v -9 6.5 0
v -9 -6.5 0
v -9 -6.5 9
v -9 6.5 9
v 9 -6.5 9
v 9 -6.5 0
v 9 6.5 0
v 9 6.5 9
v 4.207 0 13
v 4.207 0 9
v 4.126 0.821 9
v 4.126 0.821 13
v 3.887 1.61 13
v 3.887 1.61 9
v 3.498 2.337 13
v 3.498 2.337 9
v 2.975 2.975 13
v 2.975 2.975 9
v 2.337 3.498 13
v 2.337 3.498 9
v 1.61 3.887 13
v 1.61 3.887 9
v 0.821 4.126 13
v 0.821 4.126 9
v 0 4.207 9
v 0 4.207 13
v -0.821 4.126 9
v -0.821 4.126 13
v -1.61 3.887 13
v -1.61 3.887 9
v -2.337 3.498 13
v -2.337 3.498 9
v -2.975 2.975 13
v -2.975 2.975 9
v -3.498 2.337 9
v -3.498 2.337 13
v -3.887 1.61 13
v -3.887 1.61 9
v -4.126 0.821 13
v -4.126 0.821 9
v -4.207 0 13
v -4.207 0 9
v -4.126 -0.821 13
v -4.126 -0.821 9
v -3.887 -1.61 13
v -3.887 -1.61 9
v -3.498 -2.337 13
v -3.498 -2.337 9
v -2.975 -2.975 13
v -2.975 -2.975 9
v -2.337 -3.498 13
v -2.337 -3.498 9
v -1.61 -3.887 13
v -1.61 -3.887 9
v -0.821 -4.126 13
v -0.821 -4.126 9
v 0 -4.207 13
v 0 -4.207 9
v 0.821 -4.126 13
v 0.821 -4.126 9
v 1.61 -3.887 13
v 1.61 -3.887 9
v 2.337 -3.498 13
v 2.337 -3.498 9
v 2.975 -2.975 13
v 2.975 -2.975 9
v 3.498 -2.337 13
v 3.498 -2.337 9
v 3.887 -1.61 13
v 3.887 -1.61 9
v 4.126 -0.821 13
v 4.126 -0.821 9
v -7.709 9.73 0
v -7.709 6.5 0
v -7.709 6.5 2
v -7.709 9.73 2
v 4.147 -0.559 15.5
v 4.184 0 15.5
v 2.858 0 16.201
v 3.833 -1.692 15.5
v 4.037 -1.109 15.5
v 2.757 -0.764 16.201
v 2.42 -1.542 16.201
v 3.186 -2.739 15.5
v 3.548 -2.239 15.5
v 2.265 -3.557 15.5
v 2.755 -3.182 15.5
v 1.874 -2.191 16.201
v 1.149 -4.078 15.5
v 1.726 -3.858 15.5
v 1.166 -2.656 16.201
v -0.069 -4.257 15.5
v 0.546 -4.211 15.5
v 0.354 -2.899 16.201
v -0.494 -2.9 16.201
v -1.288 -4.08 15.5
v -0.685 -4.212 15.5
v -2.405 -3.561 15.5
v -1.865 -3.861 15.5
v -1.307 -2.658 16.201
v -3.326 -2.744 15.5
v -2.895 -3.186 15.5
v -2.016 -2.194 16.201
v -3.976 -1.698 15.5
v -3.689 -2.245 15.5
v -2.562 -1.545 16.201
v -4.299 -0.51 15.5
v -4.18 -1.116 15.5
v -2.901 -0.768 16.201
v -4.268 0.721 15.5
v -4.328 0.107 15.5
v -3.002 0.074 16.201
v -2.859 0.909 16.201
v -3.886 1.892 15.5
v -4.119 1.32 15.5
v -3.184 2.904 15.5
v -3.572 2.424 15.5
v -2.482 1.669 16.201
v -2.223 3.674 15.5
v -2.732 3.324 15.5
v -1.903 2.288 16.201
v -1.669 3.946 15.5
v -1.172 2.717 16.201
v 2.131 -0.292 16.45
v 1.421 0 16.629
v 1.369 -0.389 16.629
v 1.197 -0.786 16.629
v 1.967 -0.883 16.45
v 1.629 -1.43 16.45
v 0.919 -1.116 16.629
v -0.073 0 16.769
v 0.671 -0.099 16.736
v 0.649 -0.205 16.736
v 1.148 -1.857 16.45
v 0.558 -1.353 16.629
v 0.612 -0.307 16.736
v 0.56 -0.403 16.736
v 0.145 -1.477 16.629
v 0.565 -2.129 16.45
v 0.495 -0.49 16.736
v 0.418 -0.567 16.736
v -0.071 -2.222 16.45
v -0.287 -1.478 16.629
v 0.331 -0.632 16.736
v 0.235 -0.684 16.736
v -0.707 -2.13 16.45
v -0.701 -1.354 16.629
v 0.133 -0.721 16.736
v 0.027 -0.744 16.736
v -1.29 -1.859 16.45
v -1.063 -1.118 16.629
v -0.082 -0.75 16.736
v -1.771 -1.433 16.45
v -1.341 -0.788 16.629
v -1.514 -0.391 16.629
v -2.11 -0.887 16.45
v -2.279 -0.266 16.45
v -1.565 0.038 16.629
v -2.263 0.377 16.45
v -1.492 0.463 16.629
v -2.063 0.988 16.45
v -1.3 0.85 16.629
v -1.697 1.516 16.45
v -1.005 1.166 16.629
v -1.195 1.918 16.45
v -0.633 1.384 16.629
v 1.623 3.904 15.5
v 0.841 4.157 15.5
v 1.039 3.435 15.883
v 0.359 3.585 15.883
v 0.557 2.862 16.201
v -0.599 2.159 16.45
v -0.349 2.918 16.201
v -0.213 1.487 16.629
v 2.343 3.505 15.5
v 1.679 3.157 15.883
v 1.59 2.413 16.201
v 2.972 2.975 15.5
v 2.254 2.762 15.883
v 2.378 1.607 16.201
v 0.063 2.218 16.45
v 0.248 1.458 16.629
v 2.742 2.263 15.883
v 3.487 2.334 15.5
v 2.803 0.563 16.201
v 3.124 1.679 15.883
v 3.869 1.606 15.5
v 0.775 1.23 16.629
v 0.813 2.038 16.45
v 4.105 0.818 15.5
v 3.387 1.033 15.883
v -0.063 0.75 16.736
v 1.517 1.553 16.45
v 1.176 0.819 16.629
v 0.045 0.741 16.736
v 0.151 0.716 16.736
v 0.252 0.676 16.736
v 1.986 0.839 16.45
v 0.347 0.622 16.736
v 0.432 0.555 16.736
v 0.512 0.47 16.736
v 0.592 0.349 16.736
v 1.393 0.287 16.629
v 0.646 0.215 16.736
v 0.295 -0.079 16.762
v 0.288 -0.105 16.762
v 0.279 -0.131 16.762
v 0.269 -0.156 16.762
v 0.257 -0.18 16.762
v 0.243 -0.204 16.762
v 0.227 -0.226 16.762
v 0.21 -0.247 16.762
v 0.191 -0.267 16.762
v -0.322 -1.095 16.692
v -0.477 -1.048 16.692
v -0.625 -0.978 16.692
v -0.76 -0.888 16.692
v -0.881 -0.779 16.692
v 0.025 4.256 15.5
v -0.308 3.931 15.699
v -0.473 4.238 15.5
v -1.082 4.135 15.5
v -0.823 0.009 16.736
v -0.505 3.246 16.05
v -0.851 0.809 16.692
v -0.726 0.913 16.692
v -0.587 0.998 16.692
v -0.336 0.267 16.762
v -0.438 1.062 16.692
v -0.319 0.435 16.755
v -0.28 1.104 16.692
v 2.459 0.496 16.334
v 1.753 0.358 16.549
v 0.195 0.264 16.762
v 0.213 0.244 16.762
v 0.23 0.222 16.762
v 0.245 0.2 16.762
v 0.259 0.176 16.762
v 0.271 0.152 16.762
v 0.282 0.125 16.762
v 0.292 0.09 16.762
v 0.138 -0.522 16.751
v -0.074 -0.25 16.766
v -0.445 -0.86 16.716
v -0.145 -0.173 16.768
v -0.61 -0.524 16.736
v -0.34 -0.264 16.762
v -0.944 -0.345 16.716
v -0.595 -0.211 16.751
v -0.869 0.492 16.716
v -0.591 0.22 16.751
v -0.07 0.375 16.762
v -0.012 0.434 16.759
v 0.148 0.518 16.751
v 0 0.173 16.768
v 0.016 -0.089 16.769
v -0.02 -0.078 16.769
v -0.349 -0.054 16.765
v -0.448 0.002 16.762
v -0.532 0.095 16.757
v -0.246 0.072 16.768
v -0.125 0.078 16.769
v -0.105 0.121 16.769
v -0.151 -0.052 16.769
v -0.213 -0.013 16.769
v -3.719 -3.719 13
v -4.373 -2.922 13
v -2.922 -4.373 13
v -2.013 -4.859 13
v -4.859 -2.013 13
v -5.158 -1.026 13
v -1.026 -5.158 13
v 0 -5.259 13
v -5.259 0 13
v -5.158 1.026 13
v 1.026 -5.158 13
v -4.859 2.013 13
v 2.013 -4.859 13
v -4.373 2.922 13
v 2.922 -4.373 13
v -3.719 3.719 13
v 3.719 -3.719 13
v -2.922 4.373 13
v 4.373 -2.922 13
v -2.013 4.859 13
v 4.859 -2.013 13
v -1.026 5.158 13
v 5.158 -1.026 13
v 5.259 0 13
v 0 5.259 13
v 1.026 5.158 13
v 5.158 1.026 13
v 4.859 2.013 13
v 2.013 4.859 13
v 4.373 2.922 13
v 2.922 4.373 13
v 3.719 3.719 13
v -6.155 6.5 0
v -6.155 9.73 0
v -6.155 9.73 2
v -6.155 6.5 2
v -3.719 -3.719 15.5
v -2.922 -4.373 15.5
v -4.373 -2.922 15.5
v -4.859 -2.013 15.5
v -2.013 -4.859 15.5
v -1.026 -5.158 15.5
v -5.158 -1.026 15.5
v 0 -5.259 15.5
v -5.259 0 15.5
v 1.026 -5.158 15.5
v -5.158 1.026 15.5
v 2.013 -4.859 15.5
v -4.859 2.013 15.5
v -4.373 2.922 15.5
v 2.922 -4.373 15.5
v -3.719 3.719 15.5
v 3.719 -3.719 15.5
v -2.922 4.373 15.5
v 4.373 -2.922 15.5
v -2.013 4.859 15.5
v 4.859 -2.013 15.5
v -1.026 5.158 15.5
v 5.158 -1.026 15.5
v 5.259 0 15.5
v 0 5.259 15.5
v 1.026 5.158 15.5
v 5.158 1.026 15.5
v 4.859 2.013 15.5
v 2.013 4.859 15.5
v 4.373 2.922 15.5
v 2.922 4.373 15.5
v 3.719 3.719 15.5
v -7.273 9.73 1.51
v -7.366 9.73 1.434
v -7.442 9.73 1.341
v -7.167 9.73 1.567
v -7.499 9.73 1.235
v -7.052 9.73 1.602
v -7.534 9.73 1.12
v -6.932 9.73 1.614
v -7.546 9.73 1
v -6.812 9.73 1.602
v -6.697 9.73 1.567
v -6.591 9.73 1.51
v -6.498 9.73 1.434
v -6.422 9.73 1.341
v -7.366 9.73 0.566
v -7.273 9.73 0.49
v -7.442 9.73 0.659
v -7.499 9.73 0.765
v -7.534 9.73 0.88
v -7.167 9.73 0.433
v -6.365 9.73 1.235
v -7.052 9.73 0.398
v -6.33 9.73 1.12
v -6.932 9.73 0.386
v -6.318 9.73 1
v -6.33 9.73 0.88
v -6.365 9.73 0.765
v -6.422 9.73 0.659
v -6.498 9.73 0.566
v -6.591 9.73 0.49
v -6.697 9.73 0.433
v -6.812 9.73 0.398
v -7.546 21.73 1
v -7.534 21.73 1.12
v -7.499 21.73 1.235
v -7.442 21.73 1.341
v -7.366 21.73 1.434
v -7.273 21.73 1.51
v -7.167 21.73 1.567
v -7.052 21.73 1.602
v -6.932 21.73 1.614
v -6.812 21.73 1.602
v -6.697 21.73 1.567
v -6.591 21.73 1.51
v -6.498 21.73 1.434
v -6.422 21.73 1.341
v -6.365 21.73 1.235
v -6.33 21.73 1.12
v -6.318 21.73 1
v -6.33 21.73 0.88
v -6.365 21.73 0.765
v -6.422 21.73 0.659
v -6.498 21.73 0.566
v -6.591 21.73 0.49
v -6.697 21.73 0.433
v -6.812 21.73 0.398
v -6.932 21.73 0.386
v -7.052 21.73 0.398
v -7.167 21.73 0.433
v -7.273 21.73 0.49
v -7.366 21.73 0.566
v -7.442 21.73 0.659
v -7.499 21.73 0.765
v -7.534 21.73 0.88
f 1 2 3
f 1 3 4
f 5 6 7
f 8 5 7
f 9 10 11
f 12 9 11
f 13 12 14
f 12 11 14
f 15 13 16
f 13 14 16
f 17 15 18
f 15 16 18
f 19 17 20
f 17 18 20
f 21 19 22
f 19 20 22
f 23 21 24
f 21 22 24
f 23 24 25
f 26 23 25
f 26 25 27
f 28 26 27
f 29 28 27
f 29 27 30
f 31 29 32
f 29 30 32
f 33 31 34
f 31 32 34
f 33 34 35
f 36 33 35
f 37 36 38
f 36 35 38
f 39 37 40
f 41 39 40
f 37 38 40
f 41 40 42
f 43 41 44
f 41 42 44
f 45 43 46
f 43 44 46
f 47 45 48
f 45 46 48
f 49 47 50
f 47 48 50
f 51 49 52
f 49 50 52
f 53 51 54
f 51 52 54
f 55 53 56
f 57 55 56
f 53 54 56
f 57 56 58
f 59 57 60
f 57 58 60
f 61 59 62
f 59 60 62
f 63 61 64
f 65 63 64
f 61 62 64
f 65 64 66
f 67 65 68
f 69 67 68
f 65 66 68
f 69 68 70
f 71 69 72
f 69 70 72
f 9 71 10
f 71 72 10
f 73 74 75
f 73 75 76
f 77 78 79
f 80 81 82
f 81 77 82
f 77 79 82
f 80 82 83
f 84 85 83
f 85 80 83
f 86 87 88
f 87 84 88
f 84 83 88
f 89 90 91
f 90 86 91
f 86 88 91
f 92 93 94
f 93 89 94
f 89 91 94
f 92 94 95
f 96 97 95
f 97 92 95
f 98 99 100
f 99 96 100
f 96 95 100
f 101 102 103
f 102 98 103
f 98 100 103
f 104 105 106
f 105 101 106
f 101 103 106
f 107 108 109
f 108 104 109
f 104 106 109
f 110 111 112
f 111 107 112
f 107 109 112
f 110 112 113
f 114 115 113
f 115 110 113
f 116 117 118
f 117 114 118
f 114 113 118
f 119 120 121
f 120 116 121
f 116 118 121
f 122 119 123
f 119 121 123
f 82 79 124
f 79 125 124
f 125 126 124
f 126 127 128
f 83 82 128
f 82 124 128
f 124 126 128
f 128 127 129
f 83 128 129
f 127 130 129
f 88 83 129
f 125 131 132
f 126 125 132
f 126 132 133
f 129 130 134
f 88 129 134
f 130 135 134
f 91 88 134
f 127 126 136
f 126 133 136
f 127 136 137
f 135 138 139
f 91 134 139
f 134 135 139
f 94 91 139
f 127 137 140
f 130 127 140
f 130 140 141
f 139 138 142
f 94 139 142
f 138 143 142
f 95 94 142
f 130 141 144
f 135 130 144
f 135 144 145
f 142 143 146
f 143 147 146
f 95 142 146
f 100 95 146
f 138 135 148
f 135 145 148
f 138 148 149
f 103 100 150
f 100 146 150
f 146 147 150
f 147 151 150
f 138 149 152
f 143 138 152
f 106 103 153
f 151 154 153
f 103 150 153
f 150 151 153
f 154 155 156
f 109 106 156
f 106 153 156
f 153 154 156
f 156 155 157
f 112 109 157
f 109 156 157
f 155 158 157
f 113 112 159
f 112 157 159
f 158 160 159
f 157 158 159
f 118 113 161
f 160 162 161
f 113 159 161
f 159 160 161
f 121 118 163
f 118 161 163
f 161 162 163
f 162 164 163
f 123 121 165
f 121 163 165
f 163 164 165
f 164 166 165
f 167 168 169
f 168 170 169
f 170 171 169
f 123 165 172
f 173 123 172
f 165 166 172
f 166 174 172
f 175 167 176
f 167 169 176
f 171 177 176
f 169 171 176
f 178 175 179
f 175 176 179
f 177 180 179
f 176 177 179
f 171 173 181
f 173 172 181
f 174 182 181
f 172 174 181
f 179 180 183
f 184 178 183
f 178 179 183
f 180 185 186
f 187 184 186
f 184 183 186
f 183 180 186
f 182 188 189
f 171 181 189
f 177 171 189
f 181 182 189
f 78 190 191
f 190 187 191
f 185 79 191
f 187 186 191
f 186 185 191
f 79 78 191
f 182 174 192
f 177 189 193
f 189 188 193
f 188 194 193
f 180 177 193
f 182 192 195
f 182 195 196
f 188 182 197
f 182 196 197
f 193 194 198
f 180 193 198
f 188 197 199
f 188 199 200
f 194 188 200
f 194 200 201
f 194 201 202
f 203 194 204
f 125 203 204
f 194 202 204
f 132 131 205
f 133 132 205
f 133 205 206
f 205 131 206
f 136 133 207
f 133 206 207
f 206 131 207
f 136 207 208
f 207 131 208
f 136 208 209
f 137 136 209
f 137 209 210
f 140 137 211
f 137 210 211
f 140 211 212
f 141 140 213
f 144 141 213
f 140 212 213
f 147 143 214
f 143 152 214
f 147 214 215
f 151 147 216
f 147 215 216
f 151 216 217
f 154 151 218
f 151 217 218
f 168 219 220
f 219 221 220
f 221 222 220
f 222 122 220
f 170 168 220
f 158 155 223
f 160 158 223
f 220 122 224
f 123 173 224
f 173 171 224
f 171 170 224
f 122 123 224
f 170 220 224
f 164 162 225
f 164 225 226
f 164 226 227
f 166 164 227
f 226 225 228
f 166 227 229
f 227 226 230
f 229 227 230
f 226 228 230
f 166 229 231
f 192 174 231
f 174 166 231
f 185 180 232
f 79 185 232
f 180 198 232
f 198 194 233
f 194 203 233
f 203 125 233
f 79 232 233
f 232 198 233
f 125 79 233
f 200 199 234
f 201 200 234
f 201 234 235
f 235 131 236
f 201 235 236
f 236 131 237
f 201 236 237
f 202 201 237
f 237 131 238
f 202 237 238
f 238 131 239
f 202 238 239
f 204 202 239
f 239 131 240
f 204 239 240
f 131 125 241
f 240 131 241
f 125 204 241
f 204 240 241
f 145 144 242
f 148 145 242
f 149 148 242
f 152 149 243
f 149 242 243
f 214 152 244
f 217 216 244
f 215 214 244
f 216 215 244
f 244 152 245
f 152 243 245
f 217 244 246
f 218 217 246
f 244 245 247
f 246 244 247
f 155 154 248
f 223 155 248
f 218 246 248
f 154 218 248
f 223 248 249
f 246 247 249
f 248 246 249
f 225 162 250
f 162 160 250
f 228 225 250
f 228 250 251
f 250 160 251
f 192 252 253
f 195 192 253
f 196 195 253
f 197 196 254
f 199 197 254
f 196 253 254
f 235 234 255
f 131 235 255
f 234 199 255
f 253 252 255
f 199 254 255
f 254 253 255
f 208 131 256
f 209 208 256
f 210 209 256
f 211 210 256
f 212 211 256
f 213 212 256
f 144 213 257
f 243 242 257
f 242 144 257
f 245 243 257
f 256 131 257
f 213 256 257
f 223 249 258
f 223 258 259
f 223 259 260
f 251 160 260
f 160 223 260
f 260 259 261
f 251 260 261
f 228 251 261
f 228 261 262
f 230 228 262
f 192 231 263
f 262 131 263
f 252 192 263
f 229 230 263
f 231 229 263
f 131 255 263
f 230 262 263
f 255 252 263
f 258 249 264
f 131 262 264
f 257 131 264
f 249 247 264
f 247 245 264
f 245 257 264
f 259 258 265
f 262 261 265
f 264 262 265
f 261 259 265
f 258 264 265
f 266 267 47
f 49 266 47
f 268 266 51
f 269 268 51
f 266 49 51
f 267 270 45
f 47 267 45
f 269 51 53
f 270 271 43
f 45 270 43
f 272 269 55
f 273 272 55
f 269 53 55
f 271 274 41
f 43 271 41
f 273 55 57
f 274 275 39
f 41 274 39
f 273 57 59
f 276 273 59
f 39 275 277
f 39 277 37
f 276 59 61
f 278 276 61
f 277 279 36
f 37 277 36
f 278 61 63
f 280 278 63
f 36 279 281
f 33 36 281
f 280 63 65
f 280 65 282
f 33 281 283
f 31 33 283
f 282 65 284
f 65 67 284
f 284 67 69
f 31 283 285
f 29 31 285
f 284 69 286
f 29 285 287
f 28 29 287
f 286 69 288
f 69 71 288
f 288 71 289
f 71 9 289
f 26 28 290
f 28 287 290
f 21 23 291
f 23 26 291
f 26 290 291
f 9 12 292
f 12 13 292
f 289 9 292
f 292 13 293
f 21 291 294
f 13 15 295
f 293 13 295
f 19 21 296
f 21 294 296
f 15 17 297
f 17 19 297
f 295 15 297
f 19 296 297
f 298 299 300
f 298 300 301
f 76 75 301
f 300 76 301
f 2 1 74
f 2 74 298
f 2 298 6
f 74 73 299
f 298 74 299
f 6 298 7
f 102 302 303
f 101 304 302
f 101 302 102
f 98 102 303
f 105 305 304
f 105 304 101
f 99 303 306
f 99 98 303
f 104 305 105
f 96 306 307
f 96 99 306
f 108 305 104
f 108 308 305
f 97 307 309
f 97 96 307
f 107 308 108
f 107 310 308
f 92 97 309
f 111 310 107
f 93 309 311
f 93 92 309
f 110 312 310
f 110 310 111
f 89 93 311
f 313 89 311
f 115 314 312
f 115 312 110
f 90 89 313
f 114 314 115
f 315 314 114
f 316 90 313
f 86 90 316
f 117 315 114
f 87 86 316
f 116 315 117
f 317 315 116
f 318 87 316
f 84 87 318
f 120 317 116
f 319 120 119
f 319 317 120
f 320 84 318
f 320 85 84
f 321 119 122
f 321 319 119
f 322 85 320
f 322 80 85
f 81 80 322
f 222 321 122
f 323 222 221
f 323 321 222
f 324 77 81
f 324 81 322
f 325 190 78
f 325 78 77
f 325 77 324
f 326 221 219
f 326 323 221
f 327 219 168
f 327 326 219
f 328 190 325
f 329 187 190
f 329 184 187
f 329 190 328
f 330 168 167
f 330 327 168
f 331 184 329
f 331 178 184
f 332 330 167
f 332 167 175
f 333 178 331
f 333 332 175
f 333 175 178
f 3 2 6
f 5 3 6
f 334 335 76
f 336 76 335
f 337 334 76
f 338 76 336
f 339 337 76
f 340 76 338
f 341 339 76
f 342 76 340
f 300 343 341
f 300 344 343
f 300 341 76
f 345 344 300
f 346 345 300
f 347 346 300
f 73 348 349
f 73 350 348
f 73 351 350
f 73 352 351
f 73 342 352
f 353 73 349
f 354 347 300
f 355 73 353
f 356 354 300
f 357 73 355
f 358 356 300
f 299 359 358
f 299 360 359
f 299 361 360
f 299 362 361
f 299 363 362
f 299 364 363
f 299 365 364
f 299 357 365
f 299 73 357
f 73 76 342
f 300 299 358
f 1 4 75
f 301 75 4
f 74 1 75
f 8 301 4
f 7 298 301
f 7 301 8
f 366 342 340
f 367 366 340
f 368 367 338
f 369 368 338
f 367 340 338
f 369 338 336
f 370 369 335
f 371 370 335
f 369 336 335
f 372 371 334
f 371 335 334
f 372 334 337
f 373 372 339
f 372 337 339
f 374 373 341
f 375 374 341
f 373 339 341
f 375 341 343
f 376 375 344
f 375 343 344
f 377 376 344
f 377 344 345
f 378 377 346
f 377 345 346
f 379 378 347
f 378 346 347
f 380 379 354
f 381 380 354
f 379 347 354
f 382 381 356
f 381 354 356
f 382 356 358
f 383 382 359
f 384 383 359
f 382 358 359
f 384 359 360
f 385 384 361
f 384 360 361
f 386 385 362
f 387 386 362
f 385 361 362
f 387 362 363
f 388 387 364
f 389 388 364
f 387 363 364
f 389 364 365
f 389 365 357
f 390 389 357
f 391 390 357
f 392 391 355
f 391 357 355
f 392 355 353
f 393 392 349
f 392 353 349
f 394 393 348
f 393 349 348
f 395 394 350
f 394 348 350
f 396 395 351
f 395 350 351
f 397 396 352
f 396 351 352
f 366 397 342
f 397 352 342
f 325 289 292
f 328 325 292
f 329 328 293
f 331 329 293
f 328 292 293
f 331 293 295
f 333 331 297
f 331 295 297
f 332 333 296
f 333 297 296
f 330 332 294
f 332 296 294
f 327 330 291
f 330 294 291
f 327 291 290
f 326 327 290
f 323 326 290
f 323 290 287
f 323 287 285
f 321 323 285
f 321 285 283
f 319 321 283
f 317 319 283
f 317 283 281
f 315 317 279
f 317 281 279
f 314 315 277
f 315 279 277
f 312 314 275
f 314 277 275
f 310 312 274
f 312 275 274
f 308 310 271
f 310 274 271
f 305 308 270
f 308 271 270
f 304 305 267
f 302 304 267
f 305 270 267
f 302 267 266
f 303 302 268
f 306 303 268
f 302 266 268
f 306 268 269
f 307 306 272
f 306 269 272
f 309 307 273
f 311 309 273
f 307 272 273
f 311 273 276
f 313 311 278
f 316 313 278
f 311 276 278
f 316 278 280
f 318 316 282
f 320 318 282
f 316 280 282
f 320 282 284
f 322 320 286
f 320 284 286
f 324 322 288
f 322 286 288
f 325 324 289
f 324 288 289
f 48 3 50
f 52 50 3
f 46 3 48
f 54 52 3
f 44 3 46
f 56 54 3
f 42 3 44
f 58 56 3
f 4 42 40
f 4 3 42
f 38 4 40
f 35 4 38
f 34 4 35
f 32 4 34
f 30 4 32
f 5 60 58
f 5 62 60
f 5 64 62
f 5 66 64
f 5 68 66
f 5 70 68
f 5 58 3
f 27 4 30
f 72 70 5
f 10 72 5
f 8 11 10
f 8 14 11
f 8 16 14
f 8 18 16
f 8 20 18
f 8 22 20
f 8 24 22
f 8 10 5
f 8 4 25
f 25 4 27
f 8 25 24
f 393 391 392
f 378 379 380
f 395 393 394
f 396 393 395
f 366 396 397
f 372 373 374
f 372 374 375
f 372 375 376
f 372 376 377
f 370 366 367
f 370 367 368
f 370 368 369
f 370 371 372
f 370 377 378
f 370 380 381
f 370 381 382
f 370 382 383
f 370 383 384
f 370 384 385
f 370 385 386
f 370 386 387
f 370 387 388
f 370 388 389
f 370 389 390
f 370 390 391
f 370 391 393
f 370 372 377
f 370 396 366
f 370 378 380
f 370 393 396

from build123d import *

# Parameters (mm, degrees)
F0_W     = 18
F0_H     = 13
F1_DEPTH = 9
F2_R     = 4.207059
F3_DEPTH = 4
F4_R     = 5.259431
F5_DEPTH = 2.5
F7_DEPTH = 2
F8_R     = 0.61362
F9_DEPTH = 12


with BuildPart() as f1:
    # F0 (on Top) → F1 (new body)
    with BuildSketch(Plane.XY):
        Rectangle(F0_W, F0_H)
    extrude(amount=F1_DEPTH)

    # F2 (on face) → F3 (join)
    with BuildSketch(Plane.XY.offset(9)):
        Circle(F2_R)
    extrude(amount=F3_DEPTH)

    # F4 (on face) → F5 (join)
    with BuildSketch(Plane.XY.offset(13)):
        Circle(F4_R)
    extrude(amount=F5_DEPTH)

    # F6 (on face) → F7 (join)
    with BuildSketch(Plane(origin=(0, 0, 0), x_dir=(1, 0, 0), z_dir=(0, 0, -1))):
        Polygon((-6.154838, -4.973606), (-7.709091, -4.942521), (-7.709091, -9.729618), (-6.154838, -9.729618), align=None)
    extrude(amount=-F7_DEPTH)

    # F8 (on face) → F9 (join)
    with BuildSketch(Plane(origin=(0, 9.729618, 0), x_dir=(-1, 0, 0), z_dir=(0, 1, 0))):
        with Locations((6.931964, 1)):
            Circle(F8_R)
    extrude(amount=F9_DEPTH)

    # F10 (on Front) → F11 (revolve)
    with BuildSketch(Plane.XZ):
        with BuildLine():
            Line((4.402904, 14.748257), (4.402904, 15.349783))
            ThreePointArc((4.402904, 15.349783), (2.276801, 16.411373), (-0.072503, 16.769225))
            Line((-0.072503, 16.769225), (-0.072503, 14.748257))
            Line((-0.072503, 14.748257), (4.402904, 14.748257))
        make_face()
    revolve(axis=Axis((-0.072503, 0, 15.758741), (0, 0, -1)))


solid = f1.part
